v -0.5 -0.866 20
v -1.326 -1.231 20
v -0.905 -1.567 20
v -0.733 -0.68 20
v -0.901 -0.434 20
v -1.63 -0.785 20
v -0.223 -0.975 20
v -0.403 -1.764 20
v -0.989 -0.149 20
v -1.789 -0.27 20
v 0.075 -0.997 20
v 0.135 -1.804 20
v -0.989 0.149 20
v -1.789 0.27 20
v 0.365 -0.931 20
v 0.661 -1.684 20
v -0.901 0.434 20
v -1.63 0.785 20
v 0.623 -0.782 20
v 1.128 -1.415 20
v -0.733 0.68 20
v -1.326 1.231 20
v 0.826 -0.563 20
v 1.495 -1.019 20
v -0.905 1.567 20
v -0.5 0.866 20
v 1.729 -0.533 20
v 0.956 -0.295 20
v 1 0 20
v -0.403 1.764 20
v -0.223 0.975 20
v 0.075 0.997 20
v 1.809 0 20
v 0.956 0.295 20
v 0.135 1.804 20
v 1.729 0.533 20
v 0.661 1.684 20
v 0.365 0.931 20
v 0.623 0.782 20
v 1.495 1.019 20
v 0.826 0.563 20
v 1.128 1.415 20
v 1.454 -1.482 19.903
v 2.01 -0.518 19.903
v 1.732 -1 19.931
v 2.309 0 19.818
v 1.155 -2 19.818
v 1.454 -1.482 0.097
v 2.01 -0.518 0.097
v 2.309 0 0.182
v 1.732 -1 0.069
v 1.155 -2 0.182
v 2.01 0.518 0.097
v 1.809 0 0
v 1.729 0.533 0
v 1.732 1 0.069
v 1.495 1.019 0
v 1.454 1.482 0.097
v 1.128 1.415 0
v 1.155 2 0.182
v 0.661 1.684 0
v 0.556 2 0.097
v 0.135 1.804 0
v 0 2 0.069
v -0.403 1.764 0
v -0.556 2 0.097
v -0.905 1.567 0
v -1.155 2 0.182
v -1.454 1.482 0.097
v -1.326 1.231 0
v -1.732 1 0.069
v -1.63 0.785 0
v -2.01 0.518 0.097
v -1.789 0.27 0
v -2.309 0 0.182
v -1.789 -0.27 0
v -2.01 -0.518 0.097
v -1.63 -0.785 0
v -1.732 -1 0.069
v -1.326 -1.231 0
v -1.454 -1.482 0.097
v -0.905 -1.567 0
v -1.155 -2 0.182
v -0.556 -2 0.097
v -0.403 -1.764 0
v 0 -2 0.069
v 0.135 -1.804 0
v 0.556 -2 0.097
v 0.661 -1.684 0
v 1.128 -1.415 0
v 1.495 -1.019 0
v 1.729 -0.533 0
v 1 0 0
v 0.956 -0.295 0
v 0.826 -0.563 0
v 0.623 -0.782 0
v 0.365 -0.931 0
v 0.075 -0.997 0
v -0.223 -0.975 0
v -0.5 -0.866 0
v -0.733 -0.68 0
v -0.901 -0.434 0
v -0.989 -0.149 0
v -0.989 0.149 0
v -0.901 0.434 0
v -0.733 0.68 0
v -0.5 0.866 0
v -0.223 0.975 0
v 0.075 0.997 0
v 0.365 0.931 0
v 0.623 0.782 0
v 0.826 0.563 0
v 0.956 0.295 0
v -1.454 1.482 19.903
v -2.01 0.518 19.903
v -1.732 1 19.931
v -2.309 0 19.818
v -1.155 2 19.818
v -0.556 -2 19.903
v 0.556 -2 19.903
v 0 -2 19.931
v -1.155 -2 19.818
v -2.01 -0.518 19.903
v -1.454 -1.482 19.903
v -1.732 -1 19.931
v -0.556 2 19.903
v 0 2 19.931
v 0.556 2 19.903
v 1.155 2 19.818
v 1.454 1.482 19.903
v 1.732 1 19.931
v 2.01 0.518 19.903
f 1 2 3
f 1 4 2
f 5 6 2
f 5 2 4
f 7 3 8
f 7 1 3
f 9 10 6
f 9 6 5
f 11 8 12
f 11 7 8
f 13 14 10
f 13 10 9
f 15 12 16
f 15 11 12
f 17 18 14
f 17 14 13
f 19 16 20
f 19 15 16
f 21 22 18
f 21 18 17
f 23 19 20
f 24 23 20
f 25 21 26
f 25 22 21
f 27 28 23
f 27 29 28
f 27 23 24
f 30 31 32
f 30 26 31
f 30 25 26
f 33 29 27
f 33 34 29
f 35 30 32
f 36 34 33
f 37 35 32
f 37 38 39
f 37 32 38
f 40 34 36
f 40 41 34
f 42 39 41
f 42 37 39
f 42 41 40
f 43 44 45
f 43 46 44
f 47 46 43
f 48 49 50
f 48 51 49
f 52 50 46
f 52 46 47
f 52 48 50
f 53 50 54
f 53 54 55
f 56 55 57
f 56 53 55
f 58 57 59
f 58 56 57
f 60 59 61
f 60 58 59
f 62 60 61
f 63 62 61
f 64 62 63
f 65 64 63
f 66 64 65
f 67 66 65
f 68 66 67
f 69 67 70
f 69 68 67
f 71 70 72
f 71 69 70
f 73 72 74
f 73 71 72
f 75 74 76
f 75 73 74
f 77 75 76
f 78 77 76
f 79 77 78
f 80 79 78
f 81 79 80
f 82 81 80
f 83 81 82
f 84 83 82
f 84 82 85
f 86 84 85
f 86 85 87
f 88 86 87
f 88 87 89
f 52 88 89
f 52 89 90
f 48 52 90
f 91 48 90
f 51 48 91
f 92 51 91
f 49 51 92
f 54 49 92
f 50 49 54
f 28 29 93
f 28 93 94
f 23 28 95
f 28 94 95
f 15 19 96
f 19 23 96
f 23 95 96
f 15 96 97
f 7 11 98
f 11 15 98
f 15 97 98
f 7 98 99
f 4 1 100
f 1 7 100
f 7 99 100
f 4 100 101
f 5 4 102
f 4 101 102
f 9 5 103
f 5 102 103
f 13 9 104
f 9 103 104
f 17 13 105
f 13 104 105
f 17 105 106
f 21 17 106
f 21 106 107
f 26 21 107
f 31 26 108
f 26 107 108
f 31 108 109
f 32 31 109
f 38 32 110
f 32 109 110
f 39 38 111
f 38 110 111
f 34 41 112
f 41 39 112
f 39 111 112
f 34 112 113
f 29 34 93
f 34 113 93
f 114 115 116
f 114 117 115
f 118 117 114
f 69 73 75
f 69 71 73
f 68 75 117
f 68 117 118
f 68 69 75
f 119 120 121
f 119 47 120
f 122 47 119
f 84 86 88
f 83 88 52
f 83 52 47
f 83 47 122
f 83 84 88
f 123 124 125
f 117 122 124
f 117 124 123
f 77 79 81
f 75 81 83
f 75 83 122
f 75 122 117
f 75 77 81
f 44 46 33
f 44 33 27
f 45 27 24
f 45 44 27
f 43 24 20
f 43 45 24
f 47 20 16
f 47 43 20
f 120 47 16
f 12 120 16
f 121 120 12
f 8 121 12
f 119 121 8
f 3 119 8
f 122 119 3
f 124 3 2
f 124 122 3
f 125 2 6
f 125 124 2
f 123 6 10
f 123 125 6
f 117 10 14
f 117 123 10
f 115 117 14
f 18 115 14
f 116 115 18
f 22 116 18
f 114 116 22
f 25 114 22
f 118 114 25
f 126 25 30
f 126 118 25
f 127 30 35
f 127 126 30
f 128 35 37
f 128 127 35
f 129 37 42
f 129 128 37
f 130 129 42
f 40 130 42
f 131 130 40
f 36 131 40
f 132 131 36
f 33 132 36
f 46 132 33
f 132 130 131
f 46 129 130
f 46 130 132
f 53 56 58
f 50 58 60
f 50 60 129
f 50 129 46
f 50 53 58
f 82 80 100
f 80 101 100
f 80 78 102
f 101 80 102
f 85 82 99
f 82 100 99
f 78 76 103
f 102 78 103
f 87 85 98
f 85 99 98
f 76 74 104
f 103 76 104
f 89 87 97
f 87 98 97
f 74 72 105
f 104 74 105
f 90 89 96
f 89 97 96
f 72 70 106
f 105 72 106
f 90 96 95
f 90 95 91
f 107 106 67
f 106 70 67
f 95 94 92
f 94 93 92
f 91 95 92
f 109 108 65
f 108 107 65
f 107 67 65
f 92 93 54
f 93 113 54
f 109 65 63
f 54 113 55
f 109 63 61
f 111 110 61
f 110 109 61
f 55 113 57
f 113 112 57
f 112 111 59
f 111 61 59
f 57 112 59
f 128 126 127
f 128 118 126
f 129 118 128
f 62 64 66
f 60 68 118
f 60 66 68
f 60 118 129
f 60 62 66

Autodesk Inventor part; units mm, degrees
ref_plane "YZ Plane" through (0, 0, 0) normal (1, 0, 0) x (0, 1, 0)
ref_plane "XZ Plane" through (0, 0, 0) normal (0, 1, 0) x (-1, 0, 0)
ref_plane "XY Plane" through (0, 0, 0) normal (0, 0, 1) x (1, 0, 0)
sketch "Skizze1" plane through (0, 0, 0) normal (0, 0, 1) x (1, 0, 0)
  line L0 (-3.2332, 0) -> (3.2332, 0) construction
  line L1 (0, -2.8) -> (0, 2.8) construction
  circle A0 centre (0, 0) radius 2 construction
  line L2 (1.1547, 2) -> (2.3094, 0)
  line L3 (2.3094, 0) -> (1.1547, -2)
  line L4 (1.1547, -2) -> (-1.1547, -2)
  line L5 (-1.1547, -2) -> (-2.3094, 0)
  line L6 (-2.3094, 0) -> (-1.1547, 2)
  line L7 (-1.1547, 2) -> (1.1547, 2)
  circle A1 centre (0, 0) radius 1
  point P0 (0, 2)
  dimension "d0" = 4
  dimension "d1" = 2
extrude "Extrusion1" add sketch "Skizze1" along normal blind 20
sketch "Skizze2" plane through (0, 0, 0) normal (0, 1, 0) x (-1, 0, 0)
  line L0 (1.1547, 20) -> (-1.1547, 20) projected
  line L1 (-1.1547, 20) -> (-2.3094, 20) projected
  line L2 (2.3094, 20) -> (1.1547, 20) projected
  line L3 (2.3094, 0) -> (1.1547, 0) projected
  line L4 (1.1547, 0) -> (-1.1547, 0) projected
  line L5 (-1.1547, 0) -> (-2.3094, 0) projected
  line L6 (-1.8094, 20) -> (-3.6188, 20)
  line L7 (-3.6188, 20) -> (-3.6188, 19.3414)
  line L8 (-3.6188, 19.3414) -> (-1.8094, 20)
  line L9 (-1.8094, 0) -> (-3.6188, 0.6586)
  line L10 (-3.6188, 0.6586) -> (-3.6188, 0)
  line L11 (-3.6188, 0) -> (-1.8094, 0)
  line L12 (0, -2) -> (0, 12) projected
  point P0 (0, 0)
  dimension "d4" = 20
  dimension "d5" = 0.5
revolve "Umdrehung1" cut sketch "Skizze2" angle 360 about axis through (0, 0, -10) along (0, 0, 1)
properties part number "Hex Spacer 20mm"
